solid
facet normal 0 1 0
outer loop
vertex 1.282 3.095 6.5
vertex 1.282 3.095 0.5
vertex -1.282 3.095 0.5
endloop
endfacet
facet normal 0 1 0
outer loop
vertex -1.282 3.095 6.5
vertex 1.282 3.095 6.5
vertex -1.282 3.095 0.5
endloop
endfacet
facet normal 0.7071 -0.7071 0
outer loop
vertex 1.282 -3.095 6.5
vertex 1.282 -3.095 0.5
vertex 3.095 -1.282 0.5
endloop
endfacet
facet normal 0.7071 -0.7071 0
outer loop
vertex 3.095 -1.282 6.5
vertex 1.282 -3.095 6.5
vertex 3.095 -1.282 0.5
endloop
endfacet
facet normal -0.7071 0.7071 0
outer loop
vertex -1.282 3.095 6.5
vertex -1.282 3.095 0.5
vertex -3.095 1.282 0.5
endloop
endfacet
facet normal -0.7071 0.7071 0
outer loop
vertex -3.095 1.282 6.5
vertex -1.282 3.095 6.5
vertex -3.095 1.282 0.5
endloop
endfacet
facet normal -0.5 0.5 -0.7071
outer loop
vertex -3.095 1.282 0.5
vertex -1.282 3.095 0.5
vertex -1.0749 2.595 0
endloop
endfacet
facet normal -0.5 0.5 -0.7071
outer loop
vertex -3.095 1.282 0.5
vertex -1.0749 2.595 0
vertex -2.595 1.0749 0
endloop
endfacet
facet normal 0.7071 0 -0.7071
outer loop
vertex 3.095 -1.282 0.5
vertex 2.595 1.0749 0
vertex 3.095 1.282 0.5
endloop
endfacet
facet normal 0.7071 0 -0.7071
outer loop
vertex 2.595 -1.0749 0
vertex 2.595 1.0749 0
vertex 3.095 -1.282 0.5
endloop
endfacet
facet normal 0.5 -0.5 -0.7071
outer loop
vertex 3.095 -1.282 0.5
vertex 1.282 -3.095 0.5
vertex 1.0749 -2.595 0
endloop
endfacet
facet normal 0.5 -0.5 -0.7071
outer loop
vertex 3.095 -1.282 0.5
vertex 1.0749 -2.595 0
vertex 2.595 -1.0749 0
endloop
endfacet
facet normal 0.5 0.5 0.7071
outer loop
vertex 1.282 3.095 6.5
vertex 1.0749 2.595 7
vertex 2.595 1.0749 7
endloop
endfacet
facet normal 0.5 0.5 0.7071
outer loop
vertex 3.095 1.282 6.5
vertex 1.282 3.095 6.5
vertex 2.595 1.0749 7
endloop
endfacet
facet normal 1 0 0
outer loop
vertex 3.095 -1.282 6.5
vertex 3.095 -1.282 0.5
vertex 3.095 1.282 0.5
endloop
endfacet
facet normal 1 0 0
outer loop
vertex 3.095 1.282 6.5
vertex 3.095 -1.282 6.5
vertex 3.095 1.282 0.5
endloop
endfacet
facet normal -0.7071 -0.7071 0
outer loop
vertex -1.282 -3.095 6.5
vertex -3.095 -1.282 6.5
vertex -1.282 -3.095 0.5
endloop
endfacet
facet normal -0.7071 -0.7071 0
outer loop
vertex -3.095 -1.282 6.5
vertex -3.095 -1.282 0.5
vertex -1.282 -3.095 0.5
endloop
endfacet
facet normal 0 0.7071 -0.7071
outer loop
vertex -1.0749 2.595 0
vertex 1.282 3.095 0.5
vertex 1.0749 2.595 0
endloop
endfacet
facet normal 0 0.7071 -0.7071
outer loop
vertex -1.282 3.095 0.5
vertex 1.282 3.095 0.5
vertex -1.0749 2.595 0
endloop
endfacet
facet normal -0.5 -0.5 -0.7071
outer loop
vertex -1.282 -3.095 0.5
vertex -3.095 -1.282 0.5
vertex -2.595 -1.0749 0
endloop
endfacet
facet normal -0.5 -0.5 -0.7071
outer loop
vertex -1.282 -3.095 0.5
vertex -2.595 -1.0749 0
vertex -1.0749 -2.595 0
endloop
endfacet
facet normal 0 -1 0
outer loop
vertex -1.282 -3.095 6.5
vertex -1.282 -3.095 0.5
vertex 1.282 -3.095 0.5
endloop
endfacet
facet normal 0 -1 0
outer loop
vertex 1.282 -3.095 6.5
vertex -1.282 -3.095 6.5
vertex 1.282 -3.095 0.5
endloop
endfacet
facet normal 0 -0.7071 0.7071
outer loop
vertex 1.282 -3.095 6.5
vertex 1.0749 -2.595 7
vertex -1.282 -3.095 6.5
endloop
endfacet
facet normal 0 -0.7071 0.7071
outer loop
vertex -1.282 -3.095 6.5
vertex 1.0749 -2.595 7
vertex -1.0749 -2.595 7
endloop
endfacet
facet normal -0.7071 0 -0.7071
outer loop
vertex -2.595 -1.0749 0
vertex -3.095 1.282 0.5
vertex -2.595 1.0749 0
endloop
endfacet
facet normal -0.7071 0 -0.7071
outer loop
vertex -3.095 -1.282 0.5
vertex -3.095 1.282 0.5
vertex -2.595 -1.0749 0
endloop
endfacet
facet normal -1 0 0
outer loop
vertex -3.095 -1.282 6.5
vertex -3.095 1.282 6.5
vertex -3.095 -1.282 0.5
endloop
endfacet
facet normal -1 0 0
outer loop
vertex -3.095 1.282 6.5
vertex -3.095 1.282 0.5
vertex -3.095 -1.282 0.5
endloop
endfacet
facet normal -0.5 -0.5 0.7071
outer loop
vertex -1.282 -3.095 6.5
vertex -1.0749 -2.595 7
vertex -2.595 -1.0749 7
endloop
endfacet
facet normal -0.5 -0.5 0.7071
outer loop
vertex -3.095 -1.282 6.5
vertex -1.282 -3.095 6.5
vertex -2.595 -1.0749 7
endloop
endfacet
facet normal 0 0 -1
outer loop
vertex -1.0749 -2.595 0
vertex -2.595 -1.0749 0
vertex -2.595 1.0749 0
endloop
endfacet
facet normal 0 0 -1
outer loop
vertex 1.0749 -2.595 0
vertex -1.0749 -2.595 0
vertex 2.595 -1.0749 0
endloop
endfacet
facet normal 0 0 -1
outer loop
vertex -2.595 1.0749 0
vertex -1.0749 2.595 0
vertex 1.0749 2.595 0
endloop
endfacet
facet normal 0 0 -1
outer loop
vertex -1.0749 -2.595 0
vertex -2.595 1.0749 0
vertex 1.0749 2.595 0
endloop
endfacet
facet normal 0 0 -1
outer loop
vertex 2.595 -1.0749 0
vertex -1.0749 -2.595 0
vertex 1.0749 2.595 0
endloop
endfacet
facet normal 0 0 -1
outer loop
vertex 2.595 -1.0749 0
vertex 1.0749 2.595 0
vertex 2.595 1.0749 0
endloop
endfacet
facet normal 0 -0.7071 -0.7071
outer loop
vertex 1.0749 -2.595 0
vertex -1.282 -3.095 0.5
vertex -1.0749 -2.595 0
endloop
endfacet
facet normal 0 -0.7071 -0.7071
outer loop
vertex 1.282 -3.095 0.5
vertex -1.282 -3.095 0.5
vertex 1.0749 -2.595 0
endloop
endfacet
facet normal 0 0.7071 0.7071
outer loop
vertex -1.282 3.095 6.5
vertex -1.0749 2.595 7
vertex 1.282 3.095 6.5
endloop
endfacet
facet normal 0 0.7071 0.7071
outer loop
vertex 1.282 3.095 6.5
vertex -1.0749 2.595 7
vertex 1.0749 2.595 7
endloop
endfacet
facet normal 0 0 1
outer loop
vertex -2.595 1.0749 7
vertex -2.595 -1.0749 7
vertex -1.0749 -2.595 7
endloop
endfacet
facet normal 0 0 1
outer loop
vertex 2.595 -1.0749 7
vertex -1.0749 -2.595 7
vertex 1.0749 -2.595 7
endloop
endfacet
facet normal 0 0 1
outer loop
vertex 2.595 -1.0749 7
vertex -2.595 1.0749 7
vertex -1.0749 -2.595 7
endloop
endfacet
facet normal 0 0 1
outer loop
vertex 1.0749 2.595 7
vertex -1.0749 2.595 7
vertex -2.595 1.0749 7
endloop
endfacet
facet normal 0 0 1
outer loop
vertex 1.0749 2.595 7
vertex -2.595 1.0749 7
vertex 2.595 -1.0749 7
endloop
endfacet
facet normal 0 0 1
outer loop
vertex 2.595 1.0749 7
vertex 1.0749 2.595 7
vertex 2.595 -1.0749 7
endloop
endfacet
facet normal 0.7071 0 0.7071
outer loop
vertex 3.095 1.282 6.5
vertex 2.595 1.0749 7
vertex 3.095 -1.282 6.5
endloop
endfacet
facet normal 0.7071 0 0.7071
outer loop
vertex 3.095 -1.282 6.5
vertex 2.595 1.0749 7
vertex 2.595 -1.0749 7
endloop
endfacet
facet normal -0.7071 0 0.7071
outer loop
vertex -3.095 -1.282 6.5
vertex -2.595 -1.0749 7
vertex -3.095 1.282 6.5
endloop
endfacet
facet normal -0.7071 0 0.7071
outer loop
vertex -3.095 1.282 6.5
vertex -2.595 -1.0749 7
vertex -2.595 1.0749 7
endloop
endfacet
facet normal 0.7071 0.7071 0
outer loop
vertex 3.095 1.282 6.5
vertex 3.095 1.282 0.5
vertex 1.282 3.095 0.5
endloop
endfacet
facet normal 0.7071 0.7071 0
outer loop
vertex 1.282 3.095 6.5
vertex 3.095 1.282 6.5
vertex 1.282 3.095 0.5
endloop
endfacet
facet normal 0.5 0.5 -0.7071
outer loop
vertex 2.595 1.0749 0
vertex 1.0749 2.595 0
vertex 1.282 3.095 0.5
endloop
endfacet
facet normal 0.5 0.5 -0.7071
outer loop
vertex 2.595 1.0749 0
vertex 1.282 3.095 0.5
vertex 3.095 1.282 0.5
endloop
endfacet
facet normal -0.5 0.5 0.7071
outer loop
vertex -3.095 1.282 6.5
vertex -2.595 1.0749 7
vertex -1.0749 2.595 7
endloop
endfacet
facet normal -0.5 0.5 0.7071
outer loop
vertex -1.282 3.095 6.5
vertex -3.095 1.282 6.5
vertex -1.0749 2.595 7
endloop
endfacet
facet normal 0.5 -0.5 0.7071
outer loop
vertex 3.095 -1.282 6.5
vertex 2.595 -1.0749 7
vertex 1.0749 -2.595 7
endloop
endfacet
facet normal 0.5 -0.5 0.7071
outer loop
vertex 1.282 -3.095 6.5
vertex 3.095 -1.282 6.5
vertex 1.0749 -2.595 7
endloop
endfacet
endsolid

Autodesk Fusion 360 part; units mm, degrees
sketch "Sketch1" plane through (0, 0, 0) normal (0, 0, 1) x (1, 0, 0)
  circle A0 centre (0, 0) radius 3.35 construction
  line L0 (1.282, 3.095) -> (-1.282, 3.095)
  line L1 (-1.282, 3.095) -> (-3.095, 1.282)
  line L2 (-3.095, 1.282) -> (-3.095, -1.282)
  line L3 (-3.095, -1.282) -> (-1.282, -3.095)
  line L4 (-1.282, -3.095) -> (1.282, -3.095)
  line L5 (1.282, -3.095) -> (3.095, -1.282)
  line L6 (3.095, -1.282) -> (3.095, 1.282)
  line L7 (3.095, 1.282) -> (1.282, 3.095)
  dimension "d1" = 6.7
extrude "Extrude1" add sketch "Sketch1" along normal blind 7
chamfer "Chamfer1" distance 0.5 angle 45 8 edges at (-2.1885, 2.1885, 7) (-3.095, 0, 7) (-2.1885, -2.1885, 7) (2.1885, -2.1885, 7) (3.095, 0, 7) (2.1885, 2.1885, 7) (0, 3.095, 7) (0, -3.095, 7)
chamfer "Chamfer2" distance 0.5 angle 45 8 edges at (2.1885, -2.1885, 0) (-2.1885, -2.1885, 0) (-3.095, 0, 0) (-2.1885, 2.1885, 0) (0, 3.095, 0) (2.1885, 2.1885, 0) (3.095, 0, 0) (0, -3.095, 0)
